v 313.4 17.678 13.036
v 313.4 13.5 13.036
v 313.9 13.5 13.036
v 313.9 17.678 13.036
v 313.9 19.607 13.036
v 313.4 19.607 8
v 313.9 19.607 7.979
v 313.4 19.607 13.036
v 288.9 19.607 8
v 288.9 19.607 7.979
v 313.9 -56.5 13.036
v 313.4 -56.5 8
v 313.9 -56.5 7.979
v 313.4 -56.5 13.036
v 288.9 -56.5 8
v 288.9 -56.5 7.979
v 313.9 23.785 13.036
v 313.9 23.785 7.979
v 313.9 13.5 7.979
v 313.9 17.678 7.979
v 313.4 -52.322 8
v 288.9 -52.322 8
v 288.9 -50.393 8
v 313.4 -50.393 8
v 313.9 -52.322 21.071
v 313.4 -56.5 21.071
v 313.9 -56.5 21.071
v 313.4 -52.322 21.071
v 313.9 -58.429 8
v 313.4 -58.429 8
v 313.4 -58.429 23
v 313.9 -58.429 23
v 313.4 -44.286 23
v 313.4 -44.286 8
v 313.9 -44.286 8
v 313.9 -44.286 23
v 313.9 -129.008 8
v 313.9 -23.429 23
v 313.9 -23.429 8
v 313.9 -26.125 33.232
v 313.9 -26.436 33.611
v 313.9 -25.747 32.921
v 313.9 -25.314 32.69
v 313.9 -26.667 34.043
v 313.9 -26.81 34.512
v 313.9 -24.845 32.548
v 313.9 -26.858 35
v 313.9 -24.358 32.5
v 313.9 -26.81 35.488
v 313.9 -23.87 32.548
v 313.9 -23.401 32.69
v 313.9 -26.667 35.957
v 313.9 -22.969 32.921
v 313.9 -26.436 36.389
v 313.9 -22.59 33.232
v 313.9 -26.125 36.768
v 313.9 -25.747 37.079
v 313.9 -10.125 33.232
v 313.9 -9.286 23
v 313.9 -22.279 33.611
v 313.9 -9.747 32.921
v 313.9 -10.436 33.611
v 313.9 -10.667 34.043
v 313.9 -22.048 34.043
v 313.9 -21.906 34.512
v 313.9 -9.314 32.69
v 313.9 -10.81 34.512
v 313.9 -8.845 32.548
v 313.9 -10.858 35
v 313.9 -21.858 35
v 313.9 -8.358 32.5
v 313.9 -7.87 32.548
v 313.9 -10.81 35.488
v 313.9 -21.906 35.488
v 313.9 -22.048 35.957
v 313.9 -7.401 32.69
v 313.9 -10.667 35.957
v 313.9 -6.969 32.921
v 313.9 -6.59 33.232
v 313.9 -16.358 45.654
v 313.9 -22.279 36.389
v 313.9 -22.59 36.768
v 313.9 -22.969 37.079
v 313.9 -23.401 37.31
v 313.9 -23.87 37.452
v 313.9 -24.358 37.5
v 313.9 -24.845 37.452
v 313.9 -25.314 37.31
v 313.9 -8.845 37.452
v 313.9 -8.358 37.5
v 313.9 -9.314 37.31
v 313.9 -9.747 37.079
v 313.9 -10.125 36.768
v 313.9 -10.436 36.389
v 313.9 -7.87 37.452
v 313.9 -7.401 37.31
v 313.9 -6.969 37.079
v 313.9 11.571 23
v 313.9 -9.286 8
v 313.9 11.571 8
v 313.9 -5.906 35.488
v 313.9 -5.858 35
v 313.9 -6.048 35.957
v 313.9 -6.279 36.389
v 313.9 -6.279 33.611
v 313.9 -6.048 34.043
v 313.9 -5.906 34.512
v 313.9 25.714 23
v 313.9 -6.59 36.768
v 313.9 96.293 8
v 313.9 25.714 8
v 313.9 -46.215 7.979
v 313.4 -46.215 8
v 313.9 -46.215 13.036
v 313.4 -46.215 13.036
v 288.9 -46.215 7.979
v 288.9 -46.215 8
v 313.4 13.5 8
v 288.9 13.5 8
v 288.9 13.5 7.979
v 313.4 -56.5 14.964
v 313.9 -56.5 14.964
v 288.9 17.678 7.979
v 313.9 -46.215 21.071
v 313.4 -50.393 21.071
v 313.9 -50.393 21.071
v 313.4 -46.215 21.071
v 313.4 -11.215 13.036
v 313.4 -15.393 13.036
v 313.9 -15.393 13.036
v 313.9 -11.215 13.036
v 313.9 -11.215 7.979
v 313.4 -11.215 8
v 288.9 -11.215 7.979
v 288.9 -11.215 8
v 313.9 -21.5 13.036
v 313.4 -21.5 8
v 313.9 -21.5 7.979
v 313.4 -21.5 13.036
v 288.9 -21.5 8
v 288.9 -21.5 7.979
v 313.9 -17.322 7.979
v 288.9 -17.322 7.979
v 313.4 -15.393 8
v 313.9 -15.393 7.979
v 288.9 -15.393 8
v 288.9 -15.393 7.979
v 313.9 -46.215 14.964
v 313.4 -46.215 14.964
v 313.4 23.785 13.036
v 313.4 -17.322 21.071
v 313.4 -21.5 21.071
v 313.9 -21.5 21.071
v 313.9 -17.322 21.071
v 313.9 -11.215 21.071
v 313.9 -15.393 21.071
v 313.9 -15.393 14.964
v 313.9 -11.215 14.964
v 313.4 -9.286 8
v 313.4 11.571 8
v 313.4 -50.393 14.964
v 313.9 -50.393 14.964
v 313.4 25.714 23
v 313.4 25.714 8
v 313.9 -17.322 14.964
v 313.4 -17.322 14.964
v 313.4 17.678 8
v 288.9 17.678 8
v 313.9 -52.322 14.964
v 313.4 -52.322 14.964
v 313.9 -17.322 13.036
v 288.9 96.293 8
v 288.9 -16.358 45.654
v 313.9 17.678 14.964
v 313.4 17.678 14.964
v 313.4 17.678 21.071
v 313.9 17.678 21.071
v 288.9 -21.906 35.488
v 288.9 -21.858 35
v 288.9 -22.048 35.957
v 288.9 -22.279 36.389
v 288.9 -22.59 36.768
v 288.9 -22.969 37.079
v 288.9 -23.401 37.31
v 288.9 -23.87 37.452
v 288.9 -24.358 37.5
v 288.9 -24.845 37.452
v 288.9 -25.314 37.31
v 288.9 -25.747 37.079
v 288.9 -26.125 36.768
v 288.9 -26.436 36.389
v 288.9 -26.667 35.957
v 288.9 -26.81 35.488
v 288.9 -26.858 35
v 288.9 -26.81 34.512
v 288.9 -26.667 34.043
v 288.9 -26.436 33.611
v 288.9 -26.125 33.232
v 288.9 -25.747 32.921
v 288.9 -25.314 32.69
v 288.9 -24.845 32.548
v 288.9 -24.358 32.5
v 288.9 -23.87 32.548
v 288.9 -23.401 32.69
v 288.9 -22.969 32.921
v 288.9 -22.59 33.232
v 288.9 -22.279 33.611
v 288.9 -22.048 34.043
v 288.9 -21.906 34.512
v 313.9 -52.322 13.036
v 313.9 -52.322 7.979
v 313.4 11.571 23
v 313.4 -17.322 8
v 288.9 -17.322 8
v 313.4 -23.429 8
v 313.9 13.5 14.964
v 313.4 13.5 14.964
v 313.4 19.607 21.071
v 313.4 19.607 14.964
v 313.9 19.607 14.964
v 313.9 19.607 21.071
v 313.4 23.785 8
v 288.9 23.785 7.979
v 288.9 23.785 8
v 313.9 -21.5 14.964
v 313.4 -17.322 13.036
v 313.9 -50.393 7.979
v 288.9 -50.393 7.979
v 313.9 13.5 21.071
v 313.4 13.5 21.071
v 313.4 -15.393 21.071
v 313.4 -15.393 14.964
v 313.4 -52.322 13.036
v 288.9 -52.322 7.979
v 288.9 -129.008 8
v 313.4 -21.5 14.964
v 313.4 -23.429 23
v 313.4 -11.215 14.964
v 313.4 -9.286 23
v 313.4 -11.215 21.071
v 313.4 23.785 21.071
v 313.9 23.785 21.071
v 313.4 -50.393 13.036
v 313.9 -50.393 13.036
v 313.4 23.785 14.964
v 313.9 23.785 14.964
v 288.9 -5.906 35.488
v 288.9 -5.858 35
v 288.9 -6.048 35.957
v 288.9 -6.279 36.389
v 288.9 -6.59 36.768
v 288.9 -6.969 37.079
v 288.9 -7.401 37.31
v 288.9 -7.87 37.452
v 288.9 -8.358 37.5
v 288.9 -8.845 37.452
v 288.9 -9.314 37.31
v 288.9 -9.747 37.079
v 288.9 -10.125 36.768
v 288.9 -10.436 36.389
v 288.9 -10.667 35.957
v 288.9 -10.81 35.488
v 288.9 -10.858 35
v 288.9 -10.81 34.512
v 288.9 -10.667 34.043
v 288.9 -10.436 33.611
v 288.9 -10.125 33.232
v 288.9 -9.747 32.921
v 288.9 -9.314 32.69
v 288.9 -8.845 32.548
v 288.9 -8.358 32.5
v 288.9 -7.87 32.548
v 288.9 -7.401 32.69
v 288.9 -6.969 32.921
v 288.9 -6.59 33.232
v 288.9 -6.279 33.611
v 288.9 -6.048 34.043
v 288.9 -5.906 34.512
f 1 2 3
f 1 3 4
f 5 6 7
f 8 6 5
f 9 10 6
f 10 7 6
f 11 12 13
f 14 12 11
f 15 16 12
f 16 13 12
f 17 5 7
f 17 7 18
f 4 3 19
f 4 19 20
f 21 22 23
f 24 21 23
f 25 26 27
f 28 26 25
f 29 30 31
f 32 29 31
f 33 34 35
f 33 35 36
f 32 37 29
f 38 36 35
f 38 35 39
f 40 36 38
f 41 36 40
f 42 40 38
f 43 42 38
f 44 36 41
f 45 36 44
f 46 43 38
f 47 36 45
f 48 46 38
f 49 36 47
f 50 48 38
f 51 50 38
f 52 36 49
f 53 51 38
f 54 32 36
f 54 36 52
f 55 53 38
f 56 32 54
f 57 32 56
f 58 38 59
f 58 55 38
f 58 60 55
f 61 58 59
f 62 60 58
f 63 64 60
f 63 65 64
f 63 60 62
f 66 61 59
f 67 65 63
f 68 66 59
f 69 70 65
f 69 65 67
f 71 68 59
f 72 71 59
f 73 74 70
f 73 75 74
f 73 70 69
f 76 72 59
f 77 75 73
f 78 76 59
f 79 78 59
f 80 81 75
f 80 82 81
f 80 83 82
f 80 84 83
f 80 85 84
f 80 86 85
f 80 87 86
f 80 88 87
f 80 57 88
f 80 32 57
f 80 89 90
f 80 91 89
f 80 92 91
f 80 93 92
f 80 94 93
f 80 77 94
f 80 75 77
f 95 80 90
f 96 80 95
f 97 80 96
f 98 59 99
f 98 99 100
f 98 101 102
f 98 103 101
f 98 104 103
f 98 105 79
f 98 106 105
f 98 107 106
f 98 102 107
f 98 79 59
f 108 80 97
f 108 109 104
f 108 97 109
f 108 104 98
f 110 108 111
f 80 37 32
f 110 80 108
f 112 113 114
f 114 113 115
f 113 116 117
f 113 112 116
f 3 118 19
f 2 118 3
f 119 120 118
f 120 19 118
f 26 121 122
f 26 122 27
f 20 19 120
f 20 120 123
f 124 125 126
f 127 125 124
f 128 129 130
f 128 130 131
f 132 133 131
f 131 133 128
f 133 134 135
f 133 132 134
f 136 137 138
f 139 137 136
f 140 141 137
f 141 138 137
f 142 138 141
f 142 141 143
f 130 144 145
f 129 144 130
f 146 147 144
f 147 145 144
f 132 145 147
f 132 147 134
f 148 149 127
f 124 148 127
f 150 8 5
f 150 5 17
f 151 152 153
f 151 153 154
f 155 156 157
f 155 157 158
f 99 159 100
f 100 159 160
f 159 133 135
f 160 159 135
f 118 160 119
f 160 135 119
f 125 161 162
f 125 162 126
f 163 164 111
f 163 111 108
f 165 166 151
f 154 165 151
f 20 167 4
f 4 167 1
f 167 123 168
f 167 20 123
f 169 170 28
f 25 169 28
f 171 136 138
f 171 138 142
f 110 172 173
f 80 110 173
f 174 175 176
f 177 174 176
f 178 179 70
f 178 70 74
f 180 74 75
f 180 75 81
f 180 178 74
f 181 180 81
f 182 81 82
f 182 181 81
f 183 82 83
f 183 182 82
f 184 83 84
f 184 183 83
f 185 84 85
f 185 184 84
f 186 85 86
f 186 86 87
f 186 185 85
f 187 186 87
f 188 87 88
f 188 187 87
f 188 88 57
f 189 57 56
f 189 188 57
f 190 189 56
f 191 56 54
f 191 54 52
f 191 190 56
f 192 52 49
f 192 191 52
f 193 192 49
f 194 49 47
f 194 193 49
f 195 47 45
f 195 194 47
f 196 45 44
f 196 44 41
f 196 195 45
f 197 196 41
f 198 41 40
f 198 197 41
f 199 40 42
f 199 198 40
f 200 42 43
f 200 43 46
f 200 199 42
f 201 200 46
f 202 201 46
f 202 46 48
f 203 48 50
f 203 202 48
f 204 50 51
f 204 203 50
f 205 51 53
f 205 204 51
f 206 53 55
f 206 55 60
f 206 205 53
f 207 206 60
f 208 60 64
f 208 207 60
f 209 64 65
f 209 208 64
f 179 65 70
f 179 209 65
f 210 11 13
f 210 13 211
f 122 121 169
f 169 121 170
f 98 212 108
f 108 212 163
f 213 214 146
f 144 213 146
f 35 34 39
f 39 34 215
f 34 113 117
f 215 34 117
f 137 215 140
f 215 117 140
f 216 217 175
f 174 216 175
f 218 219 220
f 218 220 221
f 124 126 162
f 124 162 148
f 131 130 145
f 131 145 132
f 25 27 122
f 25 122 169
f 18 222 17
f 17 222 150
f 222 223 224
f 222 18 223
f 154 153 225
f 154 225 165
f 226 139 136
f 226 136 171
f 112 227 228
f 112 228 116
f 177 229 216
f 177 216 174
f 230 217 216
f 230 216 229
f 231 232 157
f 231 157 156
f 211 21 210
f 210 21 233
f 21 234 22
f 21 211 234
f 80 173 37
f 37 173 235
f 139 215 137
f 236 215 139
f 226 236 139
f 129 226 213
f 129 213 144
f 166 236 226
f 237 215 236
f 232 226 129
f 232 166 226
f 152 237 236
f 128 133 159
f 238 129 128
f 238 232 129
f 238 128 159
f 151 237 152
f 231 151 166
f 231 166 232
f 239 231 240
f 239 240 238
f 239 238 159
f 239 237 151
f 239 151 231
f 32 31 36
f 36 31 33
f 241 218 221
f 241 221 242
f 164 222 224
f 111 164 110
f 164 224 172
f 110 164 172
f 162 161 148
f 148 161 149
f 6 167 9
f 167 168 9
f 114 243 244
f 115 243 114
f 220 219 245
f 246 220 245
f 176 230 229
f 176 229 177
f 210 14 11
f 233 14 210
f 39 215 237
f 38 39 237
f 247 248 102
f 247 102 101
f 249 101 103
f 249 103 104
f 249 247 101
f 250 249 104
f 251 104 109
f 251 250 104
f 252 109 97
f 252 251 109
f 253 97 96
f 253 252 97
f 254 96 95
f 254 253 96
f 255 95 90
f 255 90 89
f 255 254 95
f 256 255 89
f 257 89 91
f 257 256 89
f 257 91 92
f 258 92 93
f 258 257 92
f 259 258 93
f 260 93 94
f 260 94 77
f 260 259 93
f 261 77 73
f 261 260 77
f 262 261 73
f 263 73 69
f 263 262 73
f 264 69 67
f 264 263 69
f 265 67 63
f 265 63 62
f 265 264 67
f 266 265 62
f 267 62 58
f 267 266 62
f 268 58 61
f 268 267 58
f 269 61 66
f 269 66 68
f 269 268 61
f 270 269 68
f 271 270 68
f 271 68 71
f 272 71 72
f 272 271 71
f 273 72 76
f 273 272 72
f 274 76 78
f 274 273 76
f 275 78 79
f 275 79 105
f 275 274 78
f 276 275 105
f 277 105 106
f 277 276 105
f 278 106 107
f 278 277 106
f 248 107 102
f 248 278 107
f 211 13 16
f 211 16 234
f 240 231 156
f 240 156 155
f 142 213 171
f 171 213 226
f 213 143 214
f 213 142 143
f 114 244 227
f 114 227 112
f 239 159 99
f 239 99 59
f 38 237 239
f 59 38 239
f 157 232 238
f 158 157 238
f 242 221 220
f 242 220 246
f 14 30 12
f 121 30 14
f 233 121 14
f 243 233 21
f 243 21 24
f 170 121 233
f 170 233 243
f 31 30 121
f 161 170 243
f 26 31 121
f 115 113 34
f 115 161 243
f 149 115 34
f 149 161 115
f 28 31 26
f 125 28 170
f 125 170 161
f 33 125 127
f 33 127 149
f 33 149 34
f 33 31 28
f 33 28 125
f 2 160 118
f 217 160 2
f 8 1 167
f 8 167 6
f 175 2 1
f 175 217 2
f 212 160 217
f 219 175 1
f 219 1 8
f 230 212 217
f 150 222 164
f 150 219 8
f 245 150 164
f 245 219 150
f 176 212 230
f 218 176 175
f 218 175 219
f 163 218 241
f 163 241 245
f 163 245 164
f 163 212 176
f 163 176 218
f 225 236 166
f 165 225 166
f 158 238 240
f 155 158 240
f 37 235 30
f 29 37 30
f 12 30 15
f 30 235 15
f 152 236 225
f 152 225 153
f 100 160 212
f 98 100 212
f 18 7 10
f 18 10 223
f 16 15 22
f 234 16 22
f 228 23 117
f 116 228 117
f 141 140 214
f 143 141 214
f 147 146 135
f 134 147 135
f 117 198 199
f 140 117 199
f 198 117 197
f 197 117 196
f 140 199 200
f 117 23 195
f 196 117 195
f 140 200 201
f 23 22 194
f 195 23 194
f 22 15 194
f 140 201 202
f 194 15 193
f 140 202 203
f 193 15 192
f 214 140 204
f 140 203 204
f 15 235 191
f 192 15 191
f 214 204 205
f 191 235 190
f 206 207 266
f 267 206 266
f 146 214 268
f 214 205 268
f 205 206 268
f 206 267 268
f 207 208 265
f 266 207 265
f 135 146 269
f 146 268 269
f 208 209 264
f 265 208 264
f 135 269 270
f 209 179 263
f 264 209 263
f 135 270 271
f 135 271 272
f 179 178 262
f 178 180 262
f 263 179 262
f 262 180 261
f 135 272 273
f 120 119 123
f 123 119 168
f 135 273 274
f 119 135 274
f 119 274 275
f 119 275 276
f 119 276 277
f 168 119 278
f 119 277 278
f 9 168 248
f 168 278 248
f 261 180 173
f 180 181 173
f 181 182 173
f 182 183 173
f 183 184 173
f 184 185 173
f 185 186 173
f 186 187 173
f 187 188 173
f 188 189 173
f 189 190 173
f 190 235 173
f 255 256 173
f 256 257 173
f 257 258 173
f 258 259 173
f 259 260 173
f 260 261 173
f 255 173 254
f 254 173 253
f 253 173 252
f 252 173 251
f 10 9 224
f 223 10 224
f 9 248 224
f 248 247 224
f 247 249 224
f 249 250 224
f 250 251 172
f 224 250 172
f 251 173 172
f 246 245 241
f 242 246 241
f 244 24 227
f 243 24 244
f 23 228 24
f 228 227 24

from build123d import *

# Parameters (mm, degrees)
F1_DEPTH  = 8
F3_DEPTH  = 621.7
F4_DEPTH  = 5.5
F7_DEPTH  = 5.5
F9_DEPTH  = 5.5
F11_DEPTH = 5.5
F13_DEPTH = 5.5
F15_DEPTH = 5.5
F17_DEPTH = 308.2
F18_DEPTH = 24
F20_DEPTH = 244.2
F21_DEPTH = 30.35
F22_R     = 2.5
F23_DEPTH = 0.5
F24_R     = 2.5
F25_DEPTH = 0.5
F26_R     = 2.5
F27_DEPTH = 0.5
F28_R     = 2.5
F29_DEPTH = 0.5
F30_W     = 14.1428571429
F30_H     = 18
F30_W_2   = 4.1785714286
F30_H_2   = 6.1071428571
F31_DEPTH = 0.5
F32_DEPTH = 25
F34_DEPTH = 8
F35_DEPTH = 0.5
F36_W     = 4.1785714286
F36_H     = 6.1071428571
F36_H_2   = 5.0357142857
F37_DEPTH = 24.5
F38_DEPTH = 25
F39_DEPTH = 1.05


# Not quite as in the source:
# - a feature of the source that left no trace in its solid (it failed there, or was rolled back) is left out


with BuildPart() as f1:
    # F0 (on Top) → F1 (new body)
    with BuildSketch(Plane.XY):
        Polygon((-327.3, 108.1424002851), (-327.3, -140.8575997149), (-102.6, -140.8575997149), (-102.6, -170.8575997149), (0, -170.8575997149), (0, -140.8575997149), (288.9, -140.8575997149), (288.9, 108.1424002851), (0, 108.1424002851), (0, 138.1424002851), (-102.6, 128.6424002851), (-102.6, 108.1424002851), align=None)
    extrude(amount=F1_DEPTH)

    # F2 (on face) → F3 (join)
    with BuildSketch(Plane.YZ.offset(288.9)):
        Polygon((-16.3575997149, 51.4532495908), (-146.3575997149, 8), (-140.8575997149, 8), (108.1424002851, 8), (113.6424002851, 8), align=None)
    extrude(amount=-F3_DEPTH)

    # F2 (on face) → F4 (join)
    with BuildSketch(Plane.YZ.offset(288.9)):
        Polygon((-16.3575997149, 51.4532495908), (-146.3575997149, 8), (113.6424002851, 8), align=None)
    extrude(amount=F4_DEPTH)

    # F5 (on face) → F7 (join)
    with BuildSketch(Plane.XZ.offset(170.8575997149)):
        Polygon((-51.3, 62.75), (-108.1, 8), (5.5, 8), align=None)
    extrude(amount=F7_DEPTH)

    # F8 (on face) → F9 (cut)
    with BuildSketch(Plane(origin=(-13.187163576, 142.4213666207, 0), x_dir=(-0.9957406741, -0.0921982106, 0), z_dir=(-0.0921982106, 0.9957406741, 0))):
        Polygon((91.8565413643, 4.3927081219), (38.2758658123, 55.8195932448), (-15.3048097397, 4.3927081219), align=None)
    extrude(amount=-F9_DEPTH, mode=Mode.SUBTRACT)

    # F10 (on face) → F11 (cut)
    with BuildSketch(Plane(origin=(-332.8, 0, 0), x_dir=(0, -1, 0), z_dir=(-1, 0, 0))):
        Polygon((144.6140170728, 2.7836871671), (16.3575997149, 45.6541342062), (-111.8988176431, 2.7836871671), align=None)
    extrude(amount=-F11_DEPTH, mode=Mode.SUBTRACT)

    # F12 (on face) → F13 (cut)
    with BuildSketch(Plane.YZ.offset(294.4)):
        Polygon((111.8988176431, 2.7836871671), (-16.3575997149, 45.6541342062), (-144.6140170728, 2.7836871671), align=None)
    extrude(amount=-F13_DEPTH, mode=Mode.SUBTRACT)

    # F14 (on face) → F15 (cut)
    with BuildSketch(Plane.XZ.offset(176.3575997149)):
        Polygon((1.6830285492, 4.0401099834), (-51.3, 55.1108989459), (-104.2830285492, 4.0401099834), align=None)
    extrude(amount=-F15_DEPTH, mode=Mode.SUBTRACT)

    # F16 (on face) → F17 (join)
    with BuildSketch(Plane.YZ.offset(294.4)):
        Polygon((-37.9123742622, 48.4659791319), (-36.6443145321, 44.6722981882), (-16.3575997149, 51.4532495908), (3.9291151024, 44.6722981882), (5.1971748325, 48.4659791319), (-16.3575997149, 55.670786811), align=None)
    extrude(amount=-F17_DEPTH)

    # F16 (on face) → F18 (cut)
    with BuildSketch(Plane.YZ.offset(294.4)):
        Polygon((-37.9123742622, 48.4659791319), (-36.6443145321, 44.6722981882), (-16.3575997149, 51.4532495908), (3.9291151024, 44.6722981882), (5.1971748325, 48.4659791319), (-16.3575997149, 55.670786811), align=None)
    extrude(amount=-F18_DEPTH, mode=Mode.SUBTRACT)

    # F19 (on face) → F20 (join)
    with BuildSketch(Plane(origin=(-332.8, 0, 0), x_dir=(0, -1, 0), z_dir=(-1, 0, 0))):
        Polygon((-5.1971748325, 48.4659791319), (-3.9291151024, 44.6722981882), (16.3575997149, 51.4532495908), (36.6443145321, 44.6722981882), (37.9123742622, 48.4659791319), (16.3575997149, 55.670786811), align=None)
    extrude(amount=-F20_DEPTH)

    # F19 (on face) → F21 (cut)
    with BuildSketch(Plane(origin=(-332.8, 0, 0), x_dir=(0, -1, 0), z_dir=(-1, 0, 0))):
        Polygon((-5.1971748325, 48.4659791319), (-3.9291151024, 44.6722981882), (16.3575997149, 51.4532495908), (36.6443145321, 44.6722981882), (37.9123742622, 48.4659791319), (16.3575997149, 55.670786811), align=None)
    extrude(amount=-F21_DEPTH, mode=Mode.SUBTRACT)

    # F22 (on face) → F23 (cut)
    with BuildSketch(Plane(origin=(-327.3, 0, 0), x_dir=(0, -1, 0), z_dir=(-1, 0, 0))):
        with Locations((8.3575997149, 35)):
            Circle(F22_R)
        with Locations((24.3575997149, 35)):
            Circle(F22_R)
    extrude(amount=-F23_DEPTH, mode=Mode.SUBTRACT)

    # F24 (on face) → F25 (cut)
    with BuildSketch(Plane.YZ.offset(288.9)):
        with Locations((-24.3575997149, 35)):
            Circle(F24_R)
        with Locations((-8.3575997149, 35)):
            Circle(F24_R)
    extrude(amount=-F25_DEPTH, mode=Mode.SUBTRACT)

    # F26 (on face) → F27 (cut)
    with BuildSketch(Plane.XZ.offset(170.8575997149)):
        with Locations((-59.3, 35)):
            Circle(F26_R)
        with Locations((-43.3, 35)):
            Circle(F26_R)
    extrude(amount=-F27_DEPTH, mode=Mode.SUBTRACT)

    # F28 (on face) → F29 (cut)
    with BuildSketch(Plane(origin=(-12.6822332802, 136.9681194259, 0), x_dir=(-0.9957406741, -0.0921982106, 0), z_dir=(-0.0921982106, 0.9957406741, 0))):
        with Locations((30.7829559704, 35)):
            Circle(F28_R)
        with Locations((46.7829559704, 35)):
            Circle(F28_R)
    extrude(amount=-F29_DEPTH, mode=Mode.SUBTRACT)

    # F30 (on face) → F31 (cut)
    with BuildSketch(Plane.YZ.offset(288.9)):
        with Locations((-16.3575997149, 14)):
            Rectangle(F30_W, F30_H)
        with Locations((-19.4111711434, 9.9821428571)):
            Rectangle(F30_W_2, F30_H_2, mode=Mode.SUBTRACT)
        with Locations((-13.3040282863, 9.9821428571)):
            Rectangle(F30_W_2, F30_H_2, mode=Mode.SUBTRACT)
        with Locations((-19.4111711434, 18.0178571429)):
            Rectangle(F30_W_2, F30_H_2, mode=Mode.SUBTRACT)
        with Locations((-13.3040282863, 18.0178571429)):
            Rectangle(F30_W_2, F30_H_2, mode=Mode.SUBTRACT)
        with Locations((18.6424002851, 14)):
            Rectangle(F30_W, F30_H)
        with Locations((15.5888288566, 9.9821428571)):
            Rectangle(F30_W_2, F30_H_2, mode=Mode.SUBTRACT)
        with Locations((21.6959717137, 9.9821428571)):
            Rectangle(F30_W_2, F30_H_2, mode=Mode.SUBTRACT)
        with Locations((15.5888288566, 18.0178571429)):
            Rectangle(F30_W_2, F30_H_2, mode=Mode.SUBTRACT)
        with Locations((21.6959717137, 18.0178571429)):
            Rectangle(F30_W_2, F30_H_2, mode=Mode.SUBTRACT)
        with Locations((-51.3575997149, 14)):
            Rectangle(F30_W, F30_H)
        with Locations((-54.4111711434, 9.9821428571)):
            Rectangle(F30_W_2, F30_H_2, mode=Mode.SUBTRACT)
        with Locations((-48.3040282863, 9.9821428571)):
            Rectangle(F30_W_2, F30_H_2, mode=Mode.SUBTRACT)
        with Locations((-54.4111711434, 18.0178571429)):
            Rectangle(F30_W_2, F30_H_2, mode=Mode.SUBTRACT)
        with Locations((-48.3040282863, 18.0178571429)):
            Rectangle(F30_W_2, F30_H_2, mode=Mode.SUBTRACT)
    extrude(amount=-F31_DEPTH, mode=Mode.SUBTRACT)


with BuildPart() as f32:
    # F32 (new): faces of the model
    f32_faces = [f1.part.faces().sort_by_distance(p)[0] for p in [
        (288.9, -16.3575997149, 2.5315074555),
        (288.4, -51.3575997149, 14),
        (288.4, -16.3575997149, 14),
        (288.4, 18.6424002851, 14),
    ]]
    extrude(f32_faces, amount=F32_DEPTH)

    # F34 (cut): a face of the model
    f34_faces = [f32.faces().sort_by_distance(p)[0] for p in [
        (301.4, -16.3575997149, 0),
    ]]
    extrude(f34_faces, amount=-F34_DEPTH, mode=Mode.SUBTRACT)

    # F35 (cut): faces of the model
    f35_faces = [f32.faces().sort_by_distance(p)[0] for p in [
        (288.4, 18.6424002851, 14),
        (288.4, -16.3575997149, 14),
        (288.4, -51.3575997149, 14),
    ]]
    extrude(f35_faces, amount=-F35_DEPTH, mode=Mode.SUBTRACT)

    # F36 (on face) → F37 (join)
    with BuildSketch(Plane(origin=(288.9, 0, 0), x_dir=(0, -1, 0), z_dir=(-1, 0, 0))):
        Polygon((61.9918890297, 25.6764385849), (-32.9998731613, 25.6764385849), (-32.9998731613, 8), (-23.785257428, 8), (-23.785257428, 13.0357142857), (-19.6066859994, 13.0357142857), (-19.6066859994, 8), (-17.6781145709, 8), (-17.6781145709, 13.0357142857), (-13.4995431423, 13.0357142857), (-13.4995431423, 8), (11.214742572, 8), (11.214742572, 13.0357142857), (15.3933140006, 13.0357142857), (15.3933140006, 8), (17.3218854291, 8), (17.3218854291, 13.0357142857), (21.5004568577, 13.0357142857), (21.5004568577, 8), (46.214742572, 8), (46.214742572, 13.0357142857), (50.3933140006, 13.0357142857), (50.3933140006, 8), (52.3218854291, 8), (52.3218854291, 13.0357142857), (56.5004568577, 13.0357142857), (56.5004568577, 8), (61.9918890297, 8), align=None)
        with Locations((-21.6959717137, 18.0178571429)):
            Rectangle(F36_W, F36_H, mode=Mode.SUBTRACT)
        with Locations((-15.5888288566, 18.0178571429)):
            Rectangle(F36_W, F36_H, mode=Mode.SUBTRACT)
        with Locations((13.3040282863, 18.0178571429)):
            Rectangle(F36_W, F36_H, mode=Mode.SUBTRACT)
        with Locations((19.4111711434, 18.0178571429)):
            Rectangle(F36_W, F36_H, mode=Mode.SUBTRACT)
        with Locations((48.3040282863, 18.0178571429)):
            Rectangle(F36_W, F36_H, mode=Mode.SUBTRACT)
        with Locations((54.4111711434, 18.0178571429)):
            Rectangle(F36_W, F36_H, mode=Mode.SUBTRACT)
        with Locations((-21.6959717137, 18.0178571429)):
            Rectangle(F36_W, F36_H)
        with Locations((-15.5888288566, 18.0178571429)):
            Rectangle(F36_W, F36_H)
        with Locations((-15.5888288566, 10.5178571429)):
            Rectangle(F36_W, F36_H_2)
        with Locations((-21.6959717137, 10.5178571429)):
            Rectangle(F36_W, F36_H_2)
        with Locations((13.3040282863, 18.0178571429)):
            Rectangle(F36_W, F36_H)
        with Locations((19.4111711434, 18.0178571429)):
            Rectangle(F36_W, F36_H)
        with Locations((19.4111711434, 10.5178571429)):
            Rectangle(F36_W, F36_H_2)
        with Locations((13.3040282863, 10.5178571429)):
            Rectangle(F36_W, F36_H_2)
        with Locations((48.3040282863, 18.0178571429)):
            Rectangle(F36_W, F36_H)
        with Locations((54.4111711434, 18.0178571429)):
            Rectangle(F36_W, F36_H)
        with Locations((54.4111711434, 10.5178571429)):
            Rectangle(F36_W, F36_H_2)
        with Locations((48.3040282863, 10.5178571429)):
            Rectangle(F36_W, F36_H_2)
    extrude(amount=-F37_DEPTH)

    # F30 (on face) → F38 (join)
    with BuildSketch(Plane.YZ.offset(288.9)):
        with Locations((21.6959717137, 18.0178571429)):
            Rectangle(F30_W_2, F30_H_2)
        with Locations((15.5888288566, 18.0178571429)):
            Rectangle(F30_W_2, F30_H_2)
        with Locations((15.5888288566, 9.9821428571)):
            Rectangle(F30_W_2, F30_H_2)
        with Locations((21.6959717137, 9.9821428571)):
            Rectangle(F30_W_2, F30_H_2)
        with Locations((-13.3040282863, 18.0178571429)):
            Rectangle(F30_W_2, F30_H_2)
        with Locations((-13.3040282863, 9.9821428571)):
            Rectangle(F30_W_2, F30_H_2)
        with Locations((-19.4111711434, 9.9821428571)):
            Rectangle(F30_W_2, F30_H_2)
        with Locations((-19.4111711434, 18.0178571429)):
            Rectangle(F30_W_2, F30_H_2)
        with Locations((-48.3040282863, 18.0178571429)):
            Rectangle(F30_W_2, F30_H_2)
        with Locations((-54.4111711434, 18.0178571429)):
            Rectangle(F30_W_2, F30_H_2)
        with Locations((-54.4111711434, 9.9821428571)):
            Rectangle(F30_W_2, F30_H_2)
        with Locations((-48.3040282863, 9.9821428571)):
            Rectangle(F30_W_2, F30_H_2)
    extrude(amount=F38_DEPTH)

    # F39 (cut): faces of the model
    f39_faces = [f32.faces().sort_by_distance(p)[0] for p in [
        (301.4, -54.4111711434, 6.9285714286),
        (301.4, -48.3040282863, 6.9285714286),
        (301.4, -19.4111711434, 6.9285714286),
        (301.4, -13.3040282863, 6.9285714286),
        (301.4, 15.5888288566, 6.9285714286),
        (301.4, 21.6959717137, 6.9285714286),
    ]]
    extrude(f39_faces, amount=-F39_DEPTH, mode=Mode.SUBTRACT)


solid = f32.part
